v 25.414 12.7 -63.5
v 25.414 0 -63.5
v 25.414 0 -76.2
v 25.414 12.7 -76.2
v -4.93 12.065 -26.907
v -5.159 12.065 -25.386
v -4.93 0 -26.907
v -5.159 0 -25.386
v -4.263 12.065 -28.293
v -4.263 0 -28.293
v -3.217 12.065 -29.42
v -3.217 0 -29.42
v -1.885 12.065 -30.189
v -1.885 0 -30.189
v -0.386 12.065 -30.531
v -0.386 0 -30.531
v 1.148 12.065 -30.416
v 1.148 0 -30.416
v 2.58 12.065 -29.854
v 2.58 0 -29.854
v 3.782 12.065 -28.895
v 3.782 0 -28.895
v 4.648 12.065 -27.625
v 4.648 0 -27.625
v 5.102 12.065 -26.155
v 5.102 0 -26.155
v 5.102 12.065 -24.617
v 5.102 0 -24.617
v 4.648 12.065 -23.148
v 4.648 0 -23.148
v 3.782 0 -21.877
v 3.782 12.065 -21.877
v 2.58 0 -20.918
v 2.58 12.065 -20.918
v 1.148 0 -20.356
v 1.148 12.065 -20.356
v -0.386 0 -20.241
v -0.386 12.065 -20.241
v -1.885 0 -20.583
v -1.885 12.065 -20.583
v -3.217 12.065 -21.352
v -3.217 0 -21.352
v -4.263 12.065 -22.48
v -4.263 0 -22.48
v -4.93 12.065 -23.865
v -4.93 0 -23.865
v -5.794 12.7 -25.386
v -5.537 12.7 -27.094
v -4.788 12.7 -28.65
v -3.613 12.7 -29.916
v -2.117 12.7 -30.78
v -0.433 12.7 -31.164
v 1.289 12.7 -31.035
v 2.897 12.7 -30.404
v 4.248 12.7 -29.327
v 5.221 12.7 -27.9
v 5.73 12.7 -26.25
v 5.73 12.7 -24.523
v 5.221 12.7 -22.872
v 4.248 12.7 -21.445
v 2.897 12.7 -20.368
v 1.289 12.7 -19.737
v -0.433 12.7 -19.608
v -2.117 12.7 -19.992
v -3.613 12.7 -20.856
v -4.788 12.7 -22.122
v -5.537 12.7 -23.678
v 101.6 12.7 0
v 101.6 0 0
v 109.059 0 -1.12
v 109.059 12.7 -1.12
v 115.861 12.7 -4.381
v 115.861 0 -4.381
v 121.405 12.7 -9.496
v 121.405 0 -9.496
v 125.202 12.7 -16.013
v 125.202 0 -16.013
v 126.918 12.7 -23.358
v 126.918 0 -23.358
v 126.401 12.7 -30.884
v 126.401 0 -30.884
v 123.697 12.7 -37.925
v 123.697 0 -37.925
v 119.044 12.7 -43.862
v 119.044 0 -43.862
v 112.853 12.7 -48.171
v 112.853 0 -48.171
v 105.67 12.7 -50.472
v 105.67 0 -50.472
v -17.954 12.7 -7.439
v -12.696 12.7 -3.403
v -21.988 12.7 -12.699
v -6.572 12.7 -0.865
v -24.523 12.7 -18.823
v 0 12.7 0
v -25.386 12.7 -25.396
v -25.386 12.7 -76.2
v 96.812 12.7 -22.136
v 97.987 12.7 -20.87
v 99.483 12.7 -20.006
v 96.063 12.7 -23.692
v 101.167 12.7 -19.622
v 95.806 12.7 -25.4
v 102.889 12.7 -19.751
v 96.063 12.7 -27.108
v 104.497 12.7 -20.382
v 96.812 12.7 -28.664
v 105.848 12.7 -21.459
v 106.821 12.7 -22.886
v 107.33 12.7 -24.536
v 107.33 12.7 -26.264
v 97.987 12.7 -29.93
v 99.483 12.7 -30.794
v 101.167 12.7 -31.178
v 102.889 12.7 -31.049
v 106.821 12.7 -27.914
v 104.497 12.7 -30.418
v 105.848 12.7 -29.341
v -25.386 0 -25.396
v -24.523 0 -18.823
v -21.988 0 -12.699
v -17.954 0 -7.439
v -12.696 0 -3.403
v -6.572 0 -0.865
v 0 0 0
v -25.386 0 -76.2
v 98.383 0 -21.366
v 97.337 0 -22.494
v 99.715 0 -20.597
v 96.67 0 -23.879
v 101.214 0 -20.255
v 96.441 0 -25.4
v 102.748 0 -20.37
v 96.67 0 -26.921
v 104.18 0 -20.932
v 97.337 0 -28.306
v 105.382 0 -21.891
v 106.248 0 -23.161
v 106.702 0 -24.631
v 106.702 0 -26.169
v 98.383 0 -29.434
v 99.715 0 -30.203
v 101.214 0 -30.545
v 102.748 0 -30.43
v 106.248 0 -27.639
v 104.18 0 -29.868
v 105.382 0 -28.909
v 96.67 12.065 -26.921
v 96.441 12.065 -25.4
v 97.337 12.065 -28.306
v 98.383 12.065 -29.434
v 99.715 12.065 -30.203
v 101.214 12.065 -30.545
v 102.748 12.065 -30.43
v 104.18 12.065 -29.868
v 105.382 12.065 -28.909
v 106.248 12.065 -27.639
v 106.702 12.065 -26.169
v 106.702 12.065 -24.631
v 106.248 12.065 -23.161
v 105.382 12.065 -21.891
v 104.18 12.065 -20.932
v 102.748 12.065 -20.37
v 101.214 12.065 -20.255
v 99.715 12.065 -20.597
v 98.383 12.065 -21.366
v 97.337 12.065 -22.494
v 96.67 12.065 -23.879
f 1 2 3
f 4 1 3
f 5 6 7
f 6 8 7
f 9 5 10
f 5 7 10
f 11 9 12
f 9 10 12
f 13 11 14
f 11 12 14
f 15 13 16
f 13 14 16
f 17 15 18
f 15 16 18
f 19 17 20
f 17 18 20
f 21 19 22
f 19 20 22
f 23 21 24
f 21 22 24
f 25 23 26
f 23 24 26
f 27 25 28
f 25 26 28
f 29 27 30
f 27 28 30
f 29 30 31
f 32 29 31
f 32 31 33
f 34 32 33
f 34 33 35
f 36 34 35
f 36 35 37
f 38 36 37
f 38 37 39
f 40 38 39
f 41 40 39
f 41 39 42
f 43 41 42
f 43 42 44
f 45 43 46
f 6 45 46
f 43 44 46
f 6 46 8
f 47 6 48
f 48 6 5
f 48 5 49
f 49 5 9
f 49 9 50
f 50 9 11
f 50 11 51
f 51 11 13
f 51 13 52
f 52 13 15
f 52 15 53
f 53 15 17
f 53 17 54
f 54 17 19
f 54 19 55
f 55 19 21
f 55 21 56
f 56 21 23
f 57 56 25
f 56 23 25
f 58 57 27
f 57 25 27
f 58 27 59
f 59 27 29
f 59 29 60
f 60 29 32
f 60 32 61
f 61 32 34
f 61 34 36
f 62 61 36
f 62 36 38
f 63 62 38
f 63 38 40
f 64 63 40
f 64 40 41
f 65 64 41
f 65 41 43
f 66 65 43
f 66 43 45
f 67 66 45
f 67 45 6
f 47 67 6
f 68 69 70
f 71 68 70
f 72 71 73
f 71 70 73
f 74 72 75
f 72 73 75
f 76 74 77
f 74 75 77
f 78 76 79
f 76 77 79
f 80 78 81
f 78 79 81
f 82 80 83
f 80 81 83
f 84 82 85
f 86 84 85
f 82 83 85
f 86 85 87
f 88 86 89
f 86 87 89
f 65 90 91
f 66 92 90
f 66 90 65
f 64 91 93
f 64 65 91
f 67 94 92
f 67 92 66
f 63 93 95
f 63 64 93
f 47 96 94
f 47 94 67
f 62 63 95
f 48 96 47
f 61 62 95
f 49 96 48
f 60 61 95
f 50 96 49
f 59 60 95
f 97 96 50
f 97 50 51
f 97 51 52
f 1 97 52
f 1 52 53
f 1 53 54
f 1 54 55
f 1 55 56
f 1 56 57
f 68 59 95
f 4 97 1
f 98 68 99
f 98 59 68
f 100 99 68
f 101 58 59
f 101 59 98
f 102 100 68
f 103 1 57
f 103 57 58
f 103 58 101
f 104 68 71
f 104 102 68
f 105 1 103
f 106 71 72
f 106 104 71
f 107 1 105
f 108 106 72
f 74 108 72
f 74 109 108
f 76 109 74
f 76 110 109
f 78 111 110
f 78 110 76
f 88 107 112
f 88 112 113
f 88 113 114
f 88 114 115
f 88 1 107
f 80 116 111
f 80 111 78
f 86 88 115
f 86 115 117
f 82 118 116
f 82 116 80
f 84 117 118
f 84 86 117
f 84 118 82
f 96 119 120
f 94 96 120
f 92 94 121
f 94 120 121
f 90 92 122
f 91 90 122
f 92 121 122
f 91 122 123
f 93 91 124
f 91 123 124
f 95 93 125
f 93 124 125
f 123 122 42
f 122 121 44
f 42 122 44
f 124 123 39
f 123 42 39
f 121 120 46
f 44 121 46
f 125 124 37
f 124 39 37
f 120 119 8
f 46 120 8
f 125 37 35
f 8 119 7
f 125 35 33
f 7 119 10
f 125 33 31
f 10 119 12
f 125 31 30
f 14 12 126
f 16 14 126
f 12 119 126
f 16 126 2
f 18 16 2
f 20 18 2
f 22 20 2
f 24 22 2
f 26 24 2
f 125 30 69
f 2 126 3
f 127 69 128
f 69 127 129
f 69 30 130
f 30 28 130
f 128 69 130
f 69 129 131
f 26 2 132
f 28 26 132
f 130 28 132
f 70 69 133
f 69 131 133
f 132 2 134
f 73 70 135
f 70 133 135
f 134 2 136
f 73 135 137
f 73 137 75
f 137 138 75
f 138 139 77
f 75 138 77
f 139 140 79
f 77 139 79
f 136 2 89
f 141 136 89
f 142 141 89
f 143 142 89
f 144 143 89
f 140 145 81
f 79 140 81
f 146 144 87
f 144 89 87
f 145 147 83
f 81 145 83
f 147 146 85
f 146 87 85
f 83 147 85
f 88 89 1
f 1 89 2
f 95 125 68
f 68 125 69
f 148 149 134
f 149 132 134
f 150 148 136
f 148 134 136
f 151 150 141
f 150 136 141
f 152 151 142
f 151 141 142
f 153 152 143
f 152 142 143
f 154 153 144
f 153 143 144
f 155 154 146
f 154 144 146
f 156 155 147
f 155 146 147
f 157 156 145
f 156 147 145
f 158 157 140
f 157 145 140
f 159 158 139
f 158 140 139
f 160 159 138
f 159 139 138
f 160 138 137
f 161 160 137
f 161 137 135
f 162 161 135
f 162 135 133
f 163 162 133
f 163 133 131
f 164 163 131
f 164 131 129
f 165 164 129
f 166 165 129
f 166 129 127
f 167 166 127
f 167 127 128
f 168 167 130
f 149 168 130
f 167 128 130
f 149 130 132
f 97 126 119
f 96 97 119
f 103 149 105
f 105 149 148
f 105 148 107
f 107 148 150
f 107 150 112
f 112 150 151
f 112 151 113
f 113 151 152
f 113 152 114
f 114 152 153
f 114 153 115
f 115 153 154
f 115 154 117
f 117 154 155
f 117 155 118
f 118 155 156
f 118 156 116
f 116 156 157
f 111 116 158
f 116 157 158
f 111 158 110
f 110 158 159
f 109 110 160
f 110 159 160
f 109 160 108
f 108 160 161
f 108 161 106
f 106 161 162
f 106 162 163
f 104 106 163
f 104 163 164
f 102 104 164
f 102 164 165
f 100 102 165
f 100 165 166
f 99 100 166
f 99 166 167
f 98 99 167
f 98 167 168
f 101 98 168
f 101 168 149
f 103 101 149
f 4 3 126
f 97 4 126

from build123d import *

# Parameters (mm, degrees)
BOSS_EXTRUDE2_DEPTH                        = 12.7
F_13_32_0_40625_DIAMETER_HOLE3_D           = 10.31875
F_13_32_0_40625_DIAMETER_HOLE3_CSINK_D     = 11.58875
F_13_32_0_40625_DIAMETER_HOLE3_CSINK_ANGLE = 90
F_13_32_0_40625_DIAMETER_HOLE2_D           = 10.31875
F_13_32_0_40625_DIAMETER_HOLE2_CSINK_D     = 11.58875
F_13_32_0_40625_DIAMETER_HOLE2_CSINK_ANGLE = 90


with BuildPart() as part:
    # Sketch1 → Boss-Extrude2 (new body)
    with BuildSketch(Plane(origin=(0, 0, 0), x_dir=(1, 0, 0), z_dir=(0, 1, 0))):
        with BuildLine():
            Line((0, 0), (101.6, 0))
            ThreePointArc((101.6, 0), (126.917817898, 23.358408246), (105.669972302, 50.471803395))
            Line((105.669972302, 50.471803395), (25.413803556, 63.5))
            Line((25.413803556, 63.5), (25.413803556, 76.2))
            Line((25.413803556, 76.2), (-25.386196444, 76.2))
            Line((-25.386196444, 76.2), (-25.386196444, 25.395653824))
            ThreePointArc((-25.386196444, 25.395653824), (-17.954095654, 7.438788683), (0, 0))
        make_face()
    extrude(amount=BOSS_EXTRUDE2_DEPTH)

    # 13/32 (0.40625) Diameter Hole3 (through all)
    with Locations(Plane(origin=(0, 12.7, 0), x_dir=(1, 0, 0), z_dir=(0, 1, 0))):
        with Locations((101.6, 25.4)):
            CounterSinkHole(F_13_32_0_40625_DIAMETER_HOLE3_D / 2, F_13_32_0_40625_DIAMETER_HOLE3_CSINK_D / 2, counter_sink_angle=F_13_32_0_40625_DIAMETER_HOLE3_CSINK_ANGLE)

    # 13/32 (0.40625) Diameter Hole2 (through all)
    with Locations(Plane(origin=(0, 12.7, 0), x_dir=(1, 0, 0), z_dir=(0, 1, 0))):
        with Locations((0, 25.386198205)):
            CounterSinkHole(F_13_32_0_40625_DIAMETER_HOLE2_D / 2, F_13_32_0_40625_DIAMETER_HOLE2_CSINK_D / 2, counter_sink_angle=F_13_32_0_40625_DIAMETER_HOLE2_CSINK_ANGLE)


solid = part.part
